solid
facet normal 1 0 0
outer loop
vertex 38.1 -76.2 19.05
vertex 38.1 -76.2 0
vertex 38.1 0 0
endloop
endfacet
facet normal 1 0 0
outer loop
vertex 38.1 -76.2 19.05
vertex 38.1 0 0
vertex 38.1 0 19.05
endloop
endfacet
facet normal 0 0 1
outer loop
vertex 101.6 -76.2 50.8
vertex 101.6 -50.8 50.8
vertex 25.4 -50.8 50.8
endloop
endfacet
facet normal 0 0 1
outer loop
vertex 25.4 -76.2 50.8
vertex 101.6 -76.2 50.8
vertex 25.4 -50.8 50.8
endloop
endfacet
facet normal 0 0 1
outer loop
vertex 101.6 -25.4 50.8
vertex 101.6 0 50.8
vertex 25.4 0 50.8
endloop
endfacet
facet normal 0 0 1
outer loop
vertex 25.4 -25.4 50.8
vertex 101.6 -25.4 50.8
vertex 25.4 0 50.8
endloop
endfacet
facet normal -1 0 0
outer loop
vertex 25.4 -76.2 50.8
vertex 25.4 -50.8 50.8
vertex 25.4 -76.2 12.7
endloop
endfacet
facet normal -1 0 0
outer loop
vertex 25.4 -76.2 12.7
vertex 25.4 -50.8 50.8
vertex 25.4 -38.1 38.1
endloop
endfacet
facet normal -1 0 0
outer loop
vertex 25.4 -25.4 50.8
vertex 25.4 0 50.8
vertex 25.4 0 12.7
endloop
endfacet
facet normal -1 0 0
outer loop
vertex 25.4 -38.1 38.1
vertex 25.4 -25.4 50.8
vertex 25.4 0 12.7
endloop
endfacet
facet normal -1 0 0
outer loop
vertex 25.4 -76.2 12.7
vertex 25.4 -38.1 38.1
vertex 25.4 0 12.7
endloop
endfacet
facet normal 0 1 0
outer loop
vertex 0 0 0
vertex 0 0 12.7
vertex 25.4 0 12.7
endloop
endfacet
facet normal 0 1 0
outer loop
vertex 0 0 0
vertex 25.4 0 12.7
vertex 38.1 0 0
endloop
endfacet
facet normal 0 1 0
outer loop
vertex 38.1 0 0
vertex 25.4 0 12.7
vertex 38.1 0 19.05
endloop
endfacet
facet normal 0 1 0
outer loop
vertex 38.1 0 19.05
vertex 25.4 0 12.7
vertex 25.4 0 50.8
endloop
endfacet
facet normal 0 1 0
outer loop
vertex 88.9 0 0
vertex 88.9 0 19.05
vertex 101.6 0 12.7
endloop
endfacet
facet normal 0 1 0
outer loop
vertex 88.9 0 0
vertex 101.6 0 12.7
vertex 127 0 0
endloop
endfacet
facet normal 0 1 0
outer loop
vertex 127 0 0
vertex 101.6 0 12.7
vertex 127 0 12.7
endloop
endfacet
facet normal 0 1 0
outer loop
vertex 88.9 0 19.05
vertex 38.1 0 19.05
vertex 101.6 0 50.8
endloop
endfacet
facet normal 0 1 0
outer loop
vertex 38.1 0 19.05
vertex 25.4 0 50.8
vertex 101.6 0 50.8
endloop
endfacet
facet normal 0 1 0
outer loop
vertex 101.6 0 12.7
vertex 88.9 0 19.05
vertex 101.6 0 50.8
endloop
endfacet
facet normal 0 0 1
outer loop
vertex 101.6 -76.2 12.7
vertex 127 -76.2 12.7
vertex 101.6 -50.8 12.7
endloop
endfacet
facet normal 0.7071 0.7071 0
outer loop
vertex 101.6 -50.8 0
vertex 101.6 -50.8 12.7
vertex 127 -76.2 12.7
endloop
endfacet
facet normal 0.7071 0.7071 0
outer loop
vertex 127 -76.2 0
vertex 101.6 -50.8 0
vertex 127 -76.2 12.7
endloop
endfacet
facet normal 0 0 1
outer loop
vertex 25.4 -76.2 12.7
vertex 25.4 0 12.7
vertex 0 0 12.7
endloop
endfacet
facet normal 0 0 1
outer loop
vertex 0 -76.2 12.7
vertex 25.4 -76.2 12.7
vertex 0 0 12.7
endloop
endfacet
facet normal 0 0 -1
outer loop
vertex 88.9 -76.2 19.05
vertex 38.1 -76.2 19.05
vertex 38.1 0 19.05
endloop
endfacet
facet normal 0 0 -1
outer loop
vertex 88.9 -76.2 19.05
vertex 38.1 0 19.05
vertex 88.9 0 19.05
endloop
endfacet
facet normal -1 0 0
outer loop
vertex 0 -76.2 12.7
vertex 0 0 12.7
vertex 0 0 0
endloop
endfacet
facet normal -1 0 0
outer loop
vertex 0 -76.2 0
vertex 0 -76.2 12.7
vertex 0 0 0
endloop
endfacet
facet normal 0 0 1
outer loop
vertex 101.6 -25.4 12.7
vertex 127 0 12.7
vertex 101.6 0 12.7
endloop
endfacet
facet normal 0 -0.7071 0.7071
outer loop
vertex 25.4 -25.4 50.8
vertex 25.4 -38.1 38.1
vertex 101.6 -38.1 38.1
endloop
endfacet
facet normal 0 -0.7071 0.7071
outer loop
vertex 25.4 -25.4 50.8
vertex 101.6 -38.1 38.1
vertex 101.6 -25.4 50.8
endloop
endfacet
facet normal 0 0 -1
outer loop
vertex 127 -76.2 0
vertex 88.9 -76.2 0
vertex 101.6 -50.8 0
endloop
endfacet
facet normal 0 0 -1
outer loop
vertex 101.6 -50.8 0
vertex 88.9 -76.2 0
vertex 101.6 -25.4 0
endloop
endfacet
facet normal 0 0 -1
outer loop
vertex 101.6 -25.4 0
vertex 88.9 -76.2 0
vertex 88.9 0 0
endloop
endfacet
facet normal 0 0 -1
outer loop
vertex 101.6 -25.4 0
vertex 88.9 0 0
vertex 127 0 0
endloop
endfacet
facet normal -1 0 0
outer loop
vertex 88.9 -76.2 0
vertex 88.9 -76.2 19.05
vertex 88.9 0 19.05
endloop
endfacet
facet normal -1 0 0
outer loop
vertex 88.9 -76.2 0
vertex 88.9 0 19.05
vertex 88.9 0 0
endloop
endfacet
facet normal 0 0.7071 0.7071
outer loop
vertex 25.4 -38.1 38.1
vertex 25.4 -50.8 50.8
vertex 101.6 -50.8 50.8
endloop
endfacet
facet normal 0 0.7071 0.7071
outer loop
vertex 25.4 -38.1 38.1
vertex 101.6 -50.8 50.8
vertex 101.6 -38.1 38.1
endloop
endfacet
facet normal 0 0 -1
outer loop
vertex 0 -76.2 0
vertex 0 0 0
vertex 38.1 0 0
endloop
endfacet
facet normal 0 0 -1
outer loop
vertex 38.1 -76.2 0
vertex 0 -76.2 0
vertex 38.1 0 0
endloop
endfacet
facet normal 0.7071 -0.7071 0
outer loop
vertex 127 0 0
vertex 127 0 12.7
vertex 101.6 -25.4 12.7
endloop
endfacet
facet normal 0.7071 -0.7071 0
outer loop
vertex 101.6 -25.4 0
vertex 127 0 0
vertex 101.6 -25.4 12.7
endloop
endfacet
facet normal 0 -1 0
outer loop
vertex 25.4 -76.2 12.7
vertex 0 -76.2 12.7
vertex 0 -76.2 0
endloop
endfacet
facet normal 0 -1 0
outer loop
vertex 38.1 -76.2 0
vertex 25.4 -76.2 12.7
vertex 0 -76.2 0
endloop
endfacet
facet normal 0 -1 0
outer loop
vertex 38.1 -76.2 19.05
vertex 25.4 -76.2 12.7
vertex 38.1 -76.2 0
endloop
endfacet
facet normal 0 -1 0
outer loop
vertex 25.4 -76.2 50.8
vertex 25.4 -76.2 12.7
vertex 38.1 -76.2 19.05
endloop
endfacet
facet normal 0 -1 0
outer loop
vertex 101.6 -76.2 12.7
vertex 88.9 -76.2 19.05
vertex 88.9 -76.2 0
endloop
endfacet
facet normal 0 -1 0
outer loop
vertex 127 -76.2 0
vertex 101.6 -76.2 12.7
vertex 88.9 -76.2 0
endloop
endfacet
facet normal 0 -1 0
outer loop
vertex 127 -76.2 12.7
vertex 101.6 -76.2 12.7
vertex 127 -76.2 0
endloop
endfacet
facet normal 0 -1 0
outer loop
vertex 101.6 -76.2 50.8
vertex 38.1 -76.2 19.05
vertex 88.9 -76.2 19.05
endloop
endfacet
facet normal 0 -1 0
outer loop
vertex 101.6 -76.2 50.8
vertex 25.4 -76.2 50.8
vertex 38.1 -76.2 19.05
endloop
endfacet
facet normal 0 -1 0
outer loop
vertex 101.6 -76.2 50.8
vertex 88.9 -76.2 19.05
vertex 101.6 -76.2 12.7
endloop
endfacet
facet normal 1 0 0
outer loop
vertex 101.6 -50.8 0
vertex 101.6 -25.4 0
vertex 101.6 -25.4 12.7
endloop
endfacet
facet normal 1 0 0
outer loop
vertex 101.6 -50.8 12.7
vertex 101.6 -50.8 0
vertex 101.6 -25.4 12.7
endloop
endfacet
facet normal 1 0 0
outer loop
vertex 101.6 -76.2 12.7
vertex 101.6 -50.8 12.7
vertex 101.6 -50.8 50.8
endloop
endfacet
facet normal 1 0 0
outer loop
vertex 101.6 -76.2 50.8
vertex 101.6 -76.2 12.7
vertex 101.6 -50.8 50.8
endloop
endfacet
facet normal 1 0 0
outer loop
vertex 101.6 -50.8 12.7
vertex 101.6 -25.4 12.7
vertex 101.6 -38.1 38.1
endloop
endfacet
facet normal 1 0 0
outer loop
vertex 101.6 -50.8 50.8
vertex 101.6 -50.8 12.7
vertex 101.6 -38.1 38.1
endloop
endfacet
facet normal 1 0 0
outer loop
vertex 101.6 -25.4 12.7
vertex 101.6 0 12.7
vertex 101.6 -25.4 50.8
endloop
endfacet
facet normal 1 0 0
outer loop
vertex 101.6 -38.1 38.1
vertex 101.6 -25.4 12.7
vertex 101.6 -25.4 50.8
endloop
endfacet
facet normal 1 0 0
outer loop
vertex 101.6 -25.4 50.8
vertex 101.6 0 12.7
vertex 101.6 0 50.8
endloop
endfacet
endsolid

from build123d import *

# Parameters (mm, degrees)
F1_DEPTH = 76.2
F3_DEPTH = 12.701
F5_DEPTH = 101.601


with BuildPart() as f1:
    # F0 (on Front) → F1 (new body)
    with BuildSketch(Plane.XZ):
        Polygon((0, 12.7), (0, 0), (38.1, 0), (38.1, 19.05), (88.9, 19.05), (88.9, 0), (127, 0), (127, 12.7), (101.6, 12.7), (101.6, 50.8), (25.4, 50.8), (25.4, 12.7), align=None)
    extrude(amount=F1_DEPTH)

    # F2 (on face) → F3 (cut, through all)
    with BuildSketch(Plane.XY.offset(12.7)):
        Polygon((101.6, -50.8), (127, -76.2), (127, 0), (101.6, -25.4), align=None)
    extrude(amount=-F3_DEPTH, mode=Mode.SUBTRACT)

    # F4 (on face) → F5 (cut, through all)
    with BuildSketch(Plane.YZ.offset(101.6)):
        Polygon((-25.4, 50.8), (-50.8, 50.8), (-38.1, 38.1), align=None)
    extrude(amount=-F5_DEPTH, mode=Mode.SUBTRACT)


solid = f1.part
